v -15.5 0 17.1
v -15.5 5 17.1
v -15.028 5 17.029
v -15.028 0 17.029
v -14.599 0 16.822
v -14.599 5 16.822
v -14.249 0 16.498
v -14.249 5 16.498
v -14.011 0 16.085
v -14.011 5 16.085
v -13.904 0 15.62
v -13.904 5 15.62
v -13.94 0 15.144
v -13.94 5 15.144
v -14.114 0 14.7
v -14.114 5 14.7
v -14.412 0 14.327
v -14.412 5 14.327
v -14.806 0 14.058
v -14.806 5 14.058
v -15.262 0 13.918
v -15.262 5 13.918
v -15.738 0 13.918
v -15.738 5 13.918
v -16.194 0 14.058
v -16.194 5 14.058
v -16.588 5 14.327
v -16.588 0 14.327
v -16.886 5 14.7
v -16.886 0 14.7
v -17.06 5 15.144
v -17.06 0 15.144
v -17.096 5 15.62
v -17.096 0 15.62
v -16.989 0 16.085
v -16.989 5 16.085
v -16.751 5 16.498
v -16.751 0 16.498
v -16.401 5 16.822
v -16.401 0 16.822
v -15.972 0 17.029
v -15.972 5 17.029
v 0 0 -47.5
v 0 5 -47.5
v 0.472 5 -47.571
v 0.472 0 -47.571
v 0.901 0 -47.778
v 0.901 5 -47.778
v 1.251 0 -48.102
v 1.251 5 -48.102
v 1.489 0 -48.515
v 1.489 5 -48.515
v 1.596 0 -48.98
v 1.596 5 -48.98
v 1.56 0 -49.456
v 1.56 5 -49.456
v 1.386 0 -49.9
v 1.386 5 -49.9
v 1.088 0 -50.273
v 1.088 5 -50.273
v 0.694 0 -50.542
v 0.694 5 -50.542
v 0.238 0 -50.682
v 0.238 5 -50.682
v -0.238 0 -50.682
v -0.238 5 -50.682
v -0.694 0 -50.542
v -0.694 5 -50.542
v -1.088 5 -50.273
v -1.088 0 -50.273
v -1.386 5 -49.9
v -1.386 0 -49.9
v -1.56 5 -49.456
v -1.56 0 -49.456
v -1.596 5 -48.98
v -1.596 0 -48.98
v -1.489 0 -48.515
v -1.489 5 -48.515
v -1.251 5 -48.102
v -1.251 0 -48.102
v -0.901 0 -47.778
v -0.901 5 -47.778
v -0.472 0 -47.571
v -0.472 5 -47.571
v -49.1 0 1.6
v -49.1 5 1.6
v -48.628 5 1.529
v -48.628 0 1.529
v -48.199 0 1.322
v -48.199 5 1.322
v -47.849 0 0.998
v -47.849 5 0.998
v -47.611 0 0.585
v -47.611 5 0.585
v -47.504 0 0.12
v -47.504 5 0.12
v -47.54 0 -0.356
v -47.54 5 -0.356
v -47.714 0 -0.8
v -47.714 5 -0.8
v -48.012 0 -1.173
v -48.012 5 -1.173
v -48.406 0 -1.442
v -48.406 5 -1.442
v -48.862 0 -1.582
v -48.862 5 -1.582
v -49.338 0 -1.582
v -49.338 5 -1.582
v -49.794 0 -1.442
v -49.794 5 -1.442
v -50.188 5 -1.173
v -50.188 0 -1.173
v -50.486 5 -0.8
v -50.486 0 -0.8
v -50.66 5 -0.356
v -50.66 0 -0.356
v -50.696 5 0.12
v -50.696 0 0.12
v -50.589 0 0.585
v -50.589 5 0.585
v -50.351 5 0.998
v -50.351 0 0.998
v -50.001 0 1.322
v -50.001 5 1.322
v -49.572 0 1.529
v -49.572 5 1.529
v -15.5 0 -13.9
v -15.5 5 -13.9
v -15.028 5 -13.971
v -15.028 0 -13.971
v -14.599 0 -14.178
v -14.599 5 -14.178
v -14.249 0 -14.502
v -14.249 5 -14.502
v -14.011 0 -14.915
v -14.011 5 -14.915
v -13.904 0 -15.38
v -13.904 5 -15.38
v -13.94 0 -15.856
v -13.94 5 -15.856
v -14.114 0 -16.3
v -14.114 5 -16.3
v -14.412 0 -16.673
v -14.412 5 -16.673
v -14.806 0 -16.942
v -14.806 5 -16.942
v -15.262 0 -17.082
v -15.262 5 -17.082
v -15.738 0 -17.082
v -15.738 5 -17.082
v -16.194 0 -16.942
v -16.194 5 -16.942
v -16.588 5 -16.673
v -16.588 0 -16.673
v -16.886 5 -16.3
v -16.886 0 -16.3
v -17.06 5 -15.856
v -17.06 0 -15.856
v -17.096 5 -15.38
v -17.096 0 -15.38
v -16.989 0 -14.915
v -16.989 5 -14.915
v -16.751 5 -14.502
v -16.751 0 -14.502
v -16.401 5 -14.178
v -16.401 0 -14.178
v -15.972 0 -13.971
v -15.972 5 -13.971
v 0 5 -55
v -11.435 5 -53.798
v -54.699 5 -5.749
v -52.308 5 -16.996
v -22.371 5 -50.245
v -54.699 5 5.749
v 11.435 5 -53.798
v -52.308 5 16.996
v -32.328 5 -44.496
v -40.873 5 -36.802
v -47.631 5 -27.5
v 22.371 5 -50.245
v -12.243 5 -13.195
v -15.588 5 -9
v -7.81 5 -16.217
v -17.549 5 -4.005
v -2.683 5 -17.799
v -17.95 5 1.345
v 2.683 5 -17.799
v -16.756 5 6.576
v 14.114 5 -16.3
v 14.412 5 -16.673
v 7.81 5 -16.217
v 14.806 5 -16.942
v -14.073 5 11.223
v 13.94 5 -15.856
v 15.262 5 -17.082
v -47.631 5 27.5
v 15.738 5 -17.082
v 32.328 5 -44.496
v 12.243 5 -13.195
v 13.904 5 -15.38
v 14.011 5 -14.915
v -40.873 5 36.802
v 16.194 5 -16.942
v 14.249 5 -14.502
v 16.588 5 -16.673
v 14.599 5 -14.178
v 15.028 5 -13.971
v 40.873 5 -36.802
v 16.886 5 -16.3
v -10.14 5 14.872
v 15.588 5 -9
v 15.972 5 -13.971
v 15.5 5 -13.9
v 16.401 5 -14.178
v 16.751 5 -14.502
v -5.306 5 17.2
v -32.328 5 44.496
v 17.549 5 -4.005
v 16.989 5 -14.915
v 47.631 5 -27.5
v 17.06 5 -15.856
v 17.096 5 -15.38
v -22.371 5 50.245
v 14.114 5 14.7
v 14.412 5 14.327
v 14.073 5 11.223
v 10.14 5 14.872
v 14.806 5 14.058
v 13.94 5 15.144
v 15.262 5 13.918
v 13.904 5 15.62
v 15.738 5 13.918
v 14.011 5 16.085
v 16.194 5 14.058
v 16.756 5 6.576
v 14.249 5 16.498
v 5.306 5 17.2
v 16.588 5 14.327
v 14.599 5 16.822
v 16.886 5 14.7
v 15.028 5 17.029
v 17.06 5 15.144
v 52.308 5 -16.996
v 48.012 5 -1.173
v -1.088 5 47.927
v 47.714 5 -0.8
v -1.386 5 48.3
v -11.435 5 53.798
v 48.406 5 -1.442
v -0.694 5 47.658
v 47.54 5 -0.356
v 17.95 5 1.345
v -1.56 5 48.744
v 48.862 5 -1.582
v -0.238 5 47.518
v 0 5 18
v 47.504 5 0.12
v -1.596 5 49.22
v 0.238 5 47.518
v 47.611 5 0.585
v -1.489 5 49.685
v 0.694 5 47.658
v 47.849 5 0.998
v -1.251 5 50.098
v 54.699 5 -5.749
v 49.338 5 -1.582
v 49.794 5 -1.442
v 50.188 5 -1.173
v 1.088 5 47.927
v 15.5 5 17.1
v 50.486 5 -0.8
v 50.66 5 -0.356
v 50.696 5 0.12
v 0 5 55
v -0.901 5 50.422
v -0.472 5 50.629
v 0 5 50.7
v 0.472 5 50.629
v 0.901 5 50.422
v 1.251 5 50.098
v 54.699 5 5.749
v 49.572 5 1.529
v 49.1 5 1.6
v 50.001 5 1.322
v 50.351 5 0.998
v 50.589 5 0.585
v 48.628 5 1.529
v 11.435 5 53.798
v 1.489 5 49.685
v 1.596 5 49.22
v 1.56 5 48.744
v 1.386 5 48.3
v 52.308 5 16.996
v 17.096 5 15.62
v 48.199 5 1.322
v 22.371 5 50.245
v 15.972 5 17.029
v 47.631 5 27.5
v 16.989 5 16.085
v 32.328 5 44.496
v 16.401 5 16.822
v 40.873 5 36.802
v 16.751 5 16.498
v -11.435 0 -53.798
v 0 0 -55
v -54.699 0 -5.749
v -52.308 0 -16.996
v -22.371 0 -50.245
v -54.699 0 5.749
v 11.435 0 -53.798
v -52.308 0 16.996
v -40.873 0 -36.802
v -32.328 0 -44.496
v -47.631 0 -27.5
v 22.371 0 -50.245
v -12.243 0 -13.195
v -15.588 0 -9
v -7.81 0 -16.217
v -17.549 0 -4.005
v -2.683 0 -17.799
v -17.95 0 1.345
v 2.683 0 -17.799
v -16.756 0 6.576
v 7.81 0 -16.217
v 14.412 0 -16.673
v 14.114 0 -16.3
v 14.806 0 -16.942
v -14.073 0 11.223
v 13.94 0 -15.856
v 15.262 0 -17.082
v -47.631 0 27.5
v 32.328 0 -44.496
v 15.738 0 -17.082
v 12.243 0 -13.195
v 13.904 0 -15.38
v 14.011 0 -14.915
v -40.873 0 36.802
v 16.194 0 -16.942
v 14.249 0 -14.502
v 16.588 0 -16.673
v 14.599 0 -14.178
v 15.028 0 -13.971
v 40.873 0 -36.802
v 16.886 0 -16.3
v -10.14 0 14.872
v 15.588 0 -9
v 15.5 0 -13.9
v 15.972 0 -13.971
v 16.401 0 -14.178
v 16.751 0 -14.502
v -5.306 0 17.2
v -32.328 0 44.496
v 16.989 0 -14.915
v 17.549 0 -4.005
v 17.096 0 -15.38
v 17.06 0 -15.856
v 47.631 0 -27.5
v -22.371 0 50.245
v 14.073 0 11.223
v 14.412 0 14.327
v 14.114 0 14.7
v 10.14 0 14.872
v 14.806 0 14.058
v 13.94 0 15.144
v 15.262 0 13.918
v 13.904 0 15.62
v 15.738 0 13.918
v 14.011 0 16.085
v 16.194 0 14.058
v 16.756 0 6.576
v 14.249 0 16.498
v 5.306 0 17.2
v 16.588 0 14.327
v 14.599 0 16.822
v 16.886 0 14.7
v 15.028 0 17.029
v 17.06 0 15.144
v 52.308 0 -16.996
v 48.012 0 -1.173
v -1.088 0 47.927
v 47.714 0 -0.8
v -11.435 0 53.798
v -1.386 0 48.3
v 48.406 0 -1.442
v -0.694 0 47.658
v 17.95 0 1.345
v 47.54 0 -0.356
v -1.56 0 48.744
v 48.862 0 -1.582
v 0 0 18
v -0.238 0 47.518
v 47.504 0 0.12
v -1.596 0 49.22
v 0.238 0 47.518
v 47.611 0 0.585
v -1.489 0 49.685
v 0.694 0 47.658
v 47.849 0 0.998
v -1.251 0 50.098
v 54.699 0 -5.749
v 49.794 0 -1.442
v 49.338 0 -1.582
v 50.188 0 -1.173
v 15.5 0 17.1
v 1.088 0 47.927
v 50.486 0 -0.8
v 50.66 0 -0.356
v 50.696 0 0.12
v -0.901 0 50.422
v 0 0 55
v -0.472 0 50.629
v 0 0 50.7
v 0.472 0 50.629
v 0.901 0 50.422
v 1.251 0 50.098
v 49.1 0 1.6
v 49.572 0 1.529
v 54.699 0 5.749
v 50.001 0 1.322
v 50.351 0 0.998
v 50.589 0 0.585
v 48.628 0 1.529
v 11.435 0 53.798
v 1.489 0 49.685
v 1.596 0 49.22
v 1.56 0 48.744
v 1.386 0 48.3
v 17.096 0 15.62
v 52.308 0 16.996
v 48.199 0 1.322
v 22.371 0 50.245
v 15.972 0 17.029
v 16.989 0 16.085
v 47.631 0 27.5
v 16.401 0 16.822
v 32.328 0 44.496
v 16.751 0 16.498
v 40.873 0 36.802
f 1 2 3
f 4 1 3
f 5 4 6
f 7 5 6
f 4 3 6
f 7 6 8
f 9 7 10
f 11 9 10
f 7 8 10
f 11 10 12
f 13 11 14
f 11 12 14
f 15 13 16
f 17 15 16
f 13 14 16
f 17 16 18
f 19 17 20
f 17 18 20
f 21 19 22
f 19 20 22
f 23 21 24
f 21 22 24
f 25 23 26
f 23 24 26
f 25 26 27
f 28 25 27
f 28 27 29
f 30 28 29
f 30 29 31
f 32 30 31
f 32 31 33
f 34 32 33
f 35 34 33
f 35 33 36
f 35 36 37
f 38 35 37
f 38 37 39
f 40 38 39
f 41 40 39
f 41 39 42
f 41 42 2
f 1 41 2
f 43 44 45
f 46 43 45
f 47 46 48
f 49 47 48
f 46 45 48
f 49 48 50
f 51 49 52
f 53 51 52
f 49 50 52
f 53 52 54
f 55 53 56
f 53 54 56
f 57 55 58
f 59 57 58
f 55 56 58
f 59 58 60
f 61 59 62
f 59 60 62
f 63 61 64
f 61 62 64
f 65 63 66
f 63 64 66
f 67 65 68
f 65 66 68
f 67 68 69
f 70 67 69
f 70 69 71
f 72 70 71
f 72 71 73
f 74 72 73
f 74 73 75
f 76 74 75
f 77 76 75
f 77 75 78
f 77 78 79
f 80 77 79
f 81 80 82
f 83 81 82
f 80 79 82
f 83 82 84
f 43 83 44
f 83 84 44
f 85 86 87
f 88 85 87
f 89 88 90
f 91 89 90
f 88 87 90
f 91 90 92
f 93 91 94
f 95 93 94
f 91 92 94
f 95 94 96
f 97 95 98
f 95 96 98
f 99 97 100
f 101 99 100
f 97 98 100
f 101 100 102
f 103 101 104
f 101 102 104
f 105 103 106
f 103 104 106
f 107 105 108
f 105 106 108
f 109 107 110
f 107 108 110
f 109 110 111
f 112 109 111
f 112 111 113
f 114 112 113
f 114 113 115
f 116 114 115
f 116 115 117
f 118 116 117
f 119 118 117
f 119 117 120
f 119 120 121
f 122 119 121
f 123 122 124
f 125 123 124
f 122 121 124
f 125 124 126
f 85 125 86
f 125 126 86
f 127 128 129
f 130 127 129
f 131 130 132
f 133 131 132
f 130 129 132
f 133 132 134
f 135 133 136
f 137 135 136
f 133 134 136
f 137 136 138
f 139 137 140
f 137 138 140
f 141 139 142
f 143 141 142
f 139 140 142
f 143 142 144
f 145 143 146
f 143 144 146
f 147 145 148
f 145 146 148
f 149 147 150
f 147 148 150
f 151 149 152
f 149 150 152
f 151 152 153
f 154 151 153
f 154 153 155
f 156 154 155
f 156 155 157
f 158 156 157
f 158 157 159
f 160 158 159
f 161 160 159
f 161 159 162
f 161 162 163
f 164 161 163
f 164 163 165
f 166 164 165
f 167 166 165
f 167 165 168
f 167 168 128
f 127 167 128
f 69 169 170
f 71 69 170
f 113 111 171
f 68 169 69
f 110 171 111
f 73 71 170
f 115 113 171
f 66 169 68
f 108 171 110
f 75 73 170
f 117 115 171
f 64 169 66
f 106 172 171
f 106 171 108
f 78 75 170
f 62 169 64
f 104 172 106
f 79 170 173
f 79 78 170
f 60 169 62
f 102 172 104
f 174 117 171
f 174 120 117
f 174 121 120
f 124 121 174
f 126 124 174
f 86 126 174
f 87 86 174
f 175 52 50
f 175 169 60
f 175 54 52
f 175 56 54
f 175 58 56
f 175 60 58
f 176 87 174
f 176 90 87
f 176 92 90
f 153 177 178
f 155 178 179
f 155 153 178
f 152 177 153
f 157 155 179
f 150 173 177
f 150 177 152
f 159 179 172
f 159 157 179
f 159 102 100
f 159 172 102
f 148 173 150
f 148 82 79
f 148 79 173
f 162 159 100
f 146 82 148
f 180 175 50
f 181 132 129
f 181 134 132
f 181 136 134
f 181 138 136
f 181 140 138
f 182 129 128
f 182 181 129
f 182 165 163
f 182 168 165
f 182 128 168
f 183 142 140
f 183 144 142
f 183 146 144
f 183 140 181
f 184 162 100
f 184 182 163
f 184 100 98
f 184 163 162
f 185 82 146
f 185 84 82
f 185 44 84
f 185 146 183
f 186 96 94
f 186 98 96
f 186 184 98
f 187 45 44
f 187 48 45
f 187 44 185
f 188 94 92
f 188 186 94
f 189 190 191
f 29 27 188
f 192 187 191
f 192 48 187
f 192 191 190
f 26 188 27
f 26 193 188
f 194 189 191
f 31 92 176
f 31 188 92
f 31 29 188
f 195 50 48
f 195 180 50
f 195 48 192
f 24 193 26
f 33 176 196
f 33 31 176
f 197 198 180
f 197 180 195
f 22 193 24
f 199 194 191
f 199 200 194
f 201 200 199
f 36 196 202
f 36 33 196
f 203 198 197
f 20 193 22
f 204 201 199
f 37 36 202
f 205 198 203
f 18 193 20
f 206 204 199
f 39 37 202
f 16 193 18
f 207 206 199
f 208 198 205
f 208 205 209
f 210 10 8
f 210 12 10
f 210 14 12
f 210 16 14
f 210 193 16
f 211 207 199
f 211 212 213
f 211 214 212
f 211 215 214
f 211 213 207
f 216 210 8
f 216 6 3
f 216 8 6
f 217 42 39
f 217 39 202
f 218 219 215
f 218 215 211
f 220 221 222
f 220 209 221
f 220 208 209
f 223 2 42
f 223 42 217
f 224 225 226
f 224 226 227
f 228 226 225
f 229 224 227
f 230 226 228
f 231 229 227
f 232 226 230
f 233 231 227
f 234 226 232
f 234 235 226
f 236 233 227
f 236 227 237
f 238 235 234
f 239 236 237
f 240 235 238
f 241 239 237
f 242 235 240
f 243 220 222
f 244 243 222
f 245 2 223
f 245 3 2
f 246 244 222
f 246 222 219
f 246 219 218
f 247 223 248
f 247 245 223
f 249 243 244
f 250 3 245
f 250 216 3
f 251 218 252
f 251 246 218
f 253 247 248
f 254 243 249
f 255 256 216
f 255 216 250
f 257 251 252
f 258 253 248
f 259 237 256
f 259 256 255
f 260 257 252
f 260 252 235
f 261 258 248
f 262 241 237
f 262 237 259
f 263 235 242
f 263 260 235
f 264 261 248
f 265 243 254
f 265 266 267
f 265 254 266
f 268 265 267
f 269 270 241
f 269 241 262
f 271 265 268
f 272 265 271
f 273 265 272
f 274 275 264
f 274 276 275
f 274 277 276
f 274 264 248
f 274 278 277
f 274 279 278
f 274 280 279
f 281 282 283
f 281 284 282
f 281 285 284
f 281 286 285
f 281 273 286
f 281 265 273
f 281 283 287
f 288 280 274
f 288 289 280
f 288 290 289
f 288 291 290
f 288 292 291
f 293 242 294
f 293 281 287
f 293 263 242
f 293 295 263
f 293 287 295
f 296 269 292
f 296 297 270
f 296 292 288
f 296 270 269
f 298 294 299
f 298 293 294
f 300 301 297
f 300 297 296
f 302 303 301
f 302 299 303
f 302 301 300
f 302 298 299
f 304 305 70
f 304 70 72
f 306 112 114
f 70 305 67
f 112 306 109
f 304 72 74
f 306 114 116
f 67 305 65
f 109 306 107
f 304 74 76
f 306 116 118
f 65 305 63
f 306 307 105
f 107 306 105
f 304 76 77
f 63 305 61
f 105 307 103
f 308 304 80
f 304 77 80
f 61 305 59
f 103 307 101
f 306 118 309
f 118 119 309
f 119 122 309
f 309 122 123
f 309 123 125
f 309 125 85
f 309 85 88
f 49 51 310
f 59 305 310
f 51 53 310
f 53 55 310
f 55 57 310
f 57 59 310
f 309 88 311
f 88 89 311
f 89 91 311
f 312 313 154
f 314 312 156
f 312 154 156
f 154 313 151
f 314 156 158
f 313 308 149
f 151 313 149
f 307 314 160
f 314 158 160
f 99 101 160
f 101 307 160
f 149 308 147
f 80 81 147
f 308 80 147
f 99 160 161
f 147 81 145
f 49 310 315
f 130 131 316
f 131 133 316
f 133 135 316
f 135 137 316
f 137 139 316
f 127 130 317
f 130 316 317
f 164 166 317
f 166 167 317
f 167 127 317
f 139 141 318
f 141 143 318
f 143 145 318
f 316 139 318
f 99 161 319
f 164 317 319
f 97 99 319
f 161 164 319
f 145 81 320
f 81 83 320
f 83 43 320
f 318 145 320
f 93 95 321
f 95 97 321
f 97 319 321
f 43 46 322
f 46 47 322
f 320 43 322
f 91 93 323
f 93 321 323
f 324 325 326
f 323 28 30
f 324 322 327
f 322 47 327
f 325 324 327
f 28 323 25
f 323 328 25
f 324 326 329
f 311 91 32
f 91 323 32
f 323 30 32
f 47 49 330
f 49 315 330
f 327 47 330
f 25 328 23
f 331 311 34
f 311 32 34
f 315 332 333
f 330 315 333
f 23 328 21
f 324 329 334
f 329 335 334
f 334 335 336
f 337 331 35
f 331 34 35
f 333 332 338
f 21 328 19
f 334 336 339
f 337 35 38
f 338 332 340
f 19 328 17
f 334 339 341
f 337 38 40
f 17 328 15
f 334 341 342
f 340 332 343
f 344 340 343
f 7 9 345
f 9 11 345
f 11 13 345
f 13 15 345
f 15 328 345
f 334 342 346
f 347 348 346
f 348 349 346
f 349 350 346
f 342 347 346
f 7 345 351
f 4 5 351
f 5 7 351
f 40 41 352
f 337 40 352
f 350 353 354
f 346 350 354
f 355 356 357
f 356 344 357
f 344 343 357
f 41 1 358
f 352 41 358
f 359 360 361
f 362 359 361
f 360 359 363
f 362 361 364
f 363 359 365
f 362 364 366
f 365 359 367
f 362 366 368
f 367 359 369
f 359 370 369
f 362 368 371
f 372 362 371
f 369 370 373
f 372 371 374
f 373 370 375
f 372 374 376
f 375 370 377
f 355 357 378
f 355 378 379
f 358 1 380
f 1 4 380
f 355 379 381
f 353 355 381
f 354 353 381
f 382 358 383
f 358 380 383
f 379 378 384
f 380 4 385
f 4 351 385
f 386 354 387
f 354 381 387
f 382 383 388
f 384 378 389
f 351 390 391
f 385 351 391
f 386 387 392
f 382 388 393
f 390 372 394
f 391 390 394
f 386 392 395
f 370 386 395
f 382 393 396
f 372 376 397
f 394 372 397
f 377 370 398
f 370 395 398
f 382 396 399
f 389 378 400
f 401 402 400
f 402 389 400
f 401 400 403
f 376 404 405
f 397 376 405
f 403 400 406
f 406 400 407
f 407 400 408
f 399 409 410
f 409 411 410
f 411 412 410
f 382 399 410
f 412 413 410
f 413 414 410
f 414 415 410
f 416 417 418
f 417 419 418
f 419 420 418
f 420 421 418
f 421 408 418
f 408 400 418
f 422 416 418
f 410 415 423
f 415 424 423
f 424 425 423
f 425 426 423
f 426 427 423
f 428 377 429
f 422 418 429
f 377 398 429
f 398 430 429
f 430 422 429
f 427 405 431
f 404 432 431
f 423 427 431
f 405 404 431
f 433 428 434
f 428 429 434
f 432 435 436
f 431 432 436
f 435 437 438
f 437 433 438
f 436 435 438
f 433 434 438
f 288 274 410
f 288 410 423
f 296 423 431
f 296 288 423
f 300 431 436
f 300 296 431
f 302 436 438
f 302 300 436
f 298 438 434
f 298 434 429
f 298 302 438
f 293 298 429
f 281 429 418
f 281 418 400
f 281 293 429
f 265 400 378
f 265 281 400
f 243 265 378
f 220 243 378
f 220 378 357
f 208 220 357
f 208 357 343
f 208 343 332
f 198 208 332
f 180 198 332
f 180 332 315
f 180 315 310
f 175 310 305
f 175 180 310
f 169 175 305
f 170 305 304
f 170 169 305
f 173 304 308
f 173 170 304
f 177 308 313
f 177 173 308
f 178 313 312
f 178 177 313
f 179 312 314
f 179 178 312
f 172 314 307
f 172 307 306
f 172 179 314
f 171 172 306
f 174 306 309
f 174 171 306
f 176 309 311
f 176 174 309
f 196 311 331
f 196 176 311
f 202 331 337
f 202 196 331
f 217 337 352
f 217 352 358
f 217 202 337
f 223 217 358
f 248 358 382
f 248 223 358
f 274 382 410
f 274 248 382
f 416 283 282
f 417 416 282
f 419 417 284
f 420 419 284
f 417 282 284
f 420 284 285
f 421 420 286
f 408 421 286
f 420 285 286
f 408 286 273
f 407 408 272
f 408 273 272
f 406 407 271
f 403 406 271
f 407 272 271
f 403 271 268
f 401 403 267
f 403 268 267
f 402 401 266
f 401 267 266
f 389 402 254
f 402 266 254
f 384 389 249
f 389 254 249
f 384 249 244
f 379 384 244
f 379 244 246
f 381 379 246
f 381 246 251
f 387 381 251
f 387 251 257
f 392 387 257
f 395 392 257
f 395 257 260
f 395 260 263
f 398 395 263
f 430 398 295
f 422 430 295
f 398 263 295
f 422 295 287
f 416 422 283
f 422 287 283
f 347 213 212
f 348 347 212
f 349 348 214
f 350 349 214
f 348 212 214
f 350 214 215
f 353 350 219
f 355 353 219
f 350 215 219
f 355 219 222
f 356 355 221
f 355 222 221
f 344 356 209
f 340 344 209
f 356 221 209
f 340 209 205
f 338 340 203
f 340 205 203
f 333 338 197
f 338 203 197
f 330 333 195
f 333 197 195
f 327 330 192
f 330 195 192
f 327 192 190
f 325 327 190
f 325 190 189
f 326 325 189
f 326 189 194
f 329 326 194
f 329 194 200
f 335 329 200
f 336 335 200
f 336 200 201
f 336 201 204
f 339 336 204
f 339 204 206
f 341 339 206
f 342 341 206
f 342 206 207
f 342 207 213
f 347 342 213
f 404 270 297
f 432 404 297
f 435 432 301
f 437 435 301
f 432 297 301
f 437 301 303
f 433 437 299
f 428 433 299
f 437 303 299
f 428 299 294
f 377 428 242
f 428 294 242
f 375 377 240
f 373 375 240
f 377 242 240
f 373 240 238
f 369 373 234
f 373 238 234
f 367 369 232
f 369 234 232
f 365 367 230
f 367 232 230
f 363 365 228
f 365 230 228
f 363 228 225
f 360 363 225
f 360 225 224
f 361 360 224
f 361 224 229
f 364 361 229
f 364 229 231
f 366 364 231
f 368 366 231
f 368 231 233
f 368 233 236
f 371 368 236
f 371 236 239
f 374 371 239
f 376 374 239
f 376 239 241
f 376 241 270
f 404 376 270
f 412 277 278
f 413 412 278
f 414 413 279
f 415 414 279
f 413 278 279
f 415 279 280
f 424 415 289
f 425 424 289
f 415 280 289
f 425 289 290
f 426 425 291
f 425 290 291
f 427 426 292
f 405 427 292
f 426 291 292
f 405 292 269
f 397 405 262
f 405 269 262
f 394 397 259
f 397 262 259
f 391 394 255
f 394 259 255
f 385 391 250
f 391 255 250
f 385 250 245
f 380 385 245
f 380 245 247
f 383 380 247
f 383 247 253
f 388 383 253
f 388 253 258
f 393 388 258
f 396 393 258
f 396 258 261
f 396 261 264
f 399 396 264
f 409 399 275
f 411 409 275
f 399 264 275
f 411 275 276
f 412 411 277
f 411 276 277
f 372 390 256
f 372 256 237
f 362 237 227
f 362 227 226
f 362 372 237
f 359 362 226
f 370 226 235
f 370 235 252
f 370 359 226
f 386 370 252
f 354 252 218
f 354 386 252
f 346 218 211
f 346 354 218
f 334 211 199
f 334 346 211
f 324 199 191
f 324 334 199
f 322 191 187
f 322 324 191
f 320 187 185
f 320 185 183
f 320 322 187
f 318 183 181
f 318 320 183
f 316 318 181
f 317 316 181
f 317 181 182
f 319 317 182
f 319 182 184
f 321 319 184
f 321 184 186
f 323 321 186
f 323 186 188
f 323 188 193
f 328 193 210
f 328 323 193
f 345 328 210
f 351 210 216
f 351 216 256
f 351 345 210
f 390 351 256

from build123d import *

# Parameters (mm, degrees)
SKETCH_2_W          = 46
SKETCH_2_H          = 46
SKETCH_2_R          = 18
EXTRUDE_1_DEPTH     = 5
FILLET_1_R          = 5.5
SKETCH_3_R          = 1.6
CUT_EXTRUDE_1_DEPTH = 33.908965344
SKETCH_4_R          = 55
SKETCH_4_R_2        = 1.6
SKETCH_4_R_3        = 18
EXTRUDE_2_DEPTH     = 5


with BuildPart() as part:
    # 草图2 → 凸台-拉伸1 (new body)
    with BuildSketch(Plane(origin=(0, 0, 0), x_dir=(1, 0, 0), z_dir=(0, 1, 0))):
        Rectangle(SKETCH_2_W, SKETCH_2_H)
        with Locations(Location((0, 0, 0), (0, 0, 270))):
            Circle(SKETCH_2_R, mode=Mode.SUBTRACT)
    extrude(amount=EXTRUDE_1_DEPTH)

    # 圆角1
    fillet_1_edges = [part.edges().sort_by_distance(p)[0] for p in [
        (23, 2.5, 23),
        (-23, 2.5, 23),
        (-23, 2.5, -23),
        (23, 2.5, -23),
    ]]
    fillet(fillet_1_edges, radius=FILLET_1_R)

    # 草图3 → 切除-拉伸1 (cut, through all)
    with BuildSketch(Plane(origin=(0, 5, 0), x_dir=(1, 0, 0), z_dir=(0, 1, 0))):
        with Locations(Location((-15.5, 15.5, 0), (0, 0, 270))):
            Circle(SKETCH_3_R)
        with Locations(Location((15.5, 15.5, 0), (0, 0, 270))):
            Circle(SKETCH_3_R)
        with Locations(Location((-15.5, -15.5, 0), (0, 0, 270))):
            Circle(SKETCH_3_R)
        with Locations(Location((15.5, -15.5, 0), (0, 0, 270))):
            Circle(SKETCH_3_R)
    extrude(amount=-CUT_EXTRUDE_1_DEPTH, mode=Mode.SUBTRACT)

    # 草图4 → 凸台-拉伸2 (add)
    # profile 1 of 2: a face of its own
    with BuildSketch(Plane(origin=(0, 5, 0), x_dir=(1, 0, 0), z_dir=(0, 1, 0))):
        with Locations(Location((0, 0, 0), (0, 0, 270))):
            Circle(SKETCH_4_R)
        with Locations(Location((-49.1, 0, 0), (0, 0, 270))):
            Circle(SKETCH_4_R_2, mode=Mode.SUBTRACT)
        with Locations(Location((0, -49.1, 0), (0, 0, 270))):
            Circle(SKETCH_4_R_2, mode=Mode.SUBTRACT)
        with Locations(Location((49.1, 0, 0), (0, 0, 270))):
            Circle(SKETCH_4_R_2, mode=Mode.SUBTRACT)
        with Locations(Location((0, 49.1, 0), (0, 0, 270))):
            Circle(SKETCH_4_R_2, mode=Mode.SUBTRACT)
        with BuildLine():
            Line((-17.5, -23), (17.5, -23))
            ThreePointArc((17.5, -23), (21.389087297, -21.389087297), (23, -17.5))
            Line((23, -17.5), (23, 17.5))
            ThreePointArc((23, 17.5), (21.389087297, 21.389087297), (17.5, 23))
            Line((17.5, 23), (-17.5, 23))
            ThreePointArc((-17.5, 23), (-21.389087297, 21.389087297), (-23, 17.5))
            Line((-23, 17.5), (-23, -17.5))
            ThreePointArc((-23, -17.5), (-21.389087297, -21.389087297), (-17.5, -23))
        make_face(mode=Mode.SUBTRACT)
    # profile 2 of 2: a face of its own
    with BuildSketch(Plane(origin=(0, 5, 0), x_dir=(1, 0, 0), z_dir=(0, 1, 0))):
        with BuildLine():
            ThreePointArc((-23, -17.5), (-21.389087297, -21.389087297), (-17.5, -23))
            Line((-17.5, -23), (17.5, -23))
            ThreePointArc((17.5, -23), (21.389087297, -21.389087297), (23, -17.5))
            Line((23, -17.5), (23, 17.5))
            ThreePointArc((23, 17.5), (21.389087297, 21.389087297), (17.5, 23))
            Line((17.5, 23), (-17.5, 23))
            ThreePointArc((-17.5, 23), (-21.389087297, 21.389087297), (-23, 17.5))
            Line((-23, 17.5), (-23, -17.5))
        make_face()
        with Locations(Location((15.5, 15.5, 0), (0, 0, 270))):
            Circle(SKETCH_4_R_2, mode=Mode.SUBTRACT)
        with Locations(Location((-15.5, -15.5, 0), (0, 0, 270))):
            Circle(SKETCH_4_R_2, mode=Mode.SUBTRACT)
        with Locations(Location((0, 0, 0), (0, 0, 270))):
            Circle(SKETCH_4_R_3, mode=Mode.SUBTRACT)
        with Locations(Location((-15.5, 15.5, 0), (0, 0, 270))):
            Circle(SKETCH_4_R_2, mode=Mode.SUBTRACT)
        with Locations(Location((15.5, -15.5, 0), (0, 0, 270))):
            Circle(SKETCH_4_R_2, mode=Mode.SUBTRACT)
    extrude(amount=-EXTRUDE_2_DEPTH)


solid = part.part
